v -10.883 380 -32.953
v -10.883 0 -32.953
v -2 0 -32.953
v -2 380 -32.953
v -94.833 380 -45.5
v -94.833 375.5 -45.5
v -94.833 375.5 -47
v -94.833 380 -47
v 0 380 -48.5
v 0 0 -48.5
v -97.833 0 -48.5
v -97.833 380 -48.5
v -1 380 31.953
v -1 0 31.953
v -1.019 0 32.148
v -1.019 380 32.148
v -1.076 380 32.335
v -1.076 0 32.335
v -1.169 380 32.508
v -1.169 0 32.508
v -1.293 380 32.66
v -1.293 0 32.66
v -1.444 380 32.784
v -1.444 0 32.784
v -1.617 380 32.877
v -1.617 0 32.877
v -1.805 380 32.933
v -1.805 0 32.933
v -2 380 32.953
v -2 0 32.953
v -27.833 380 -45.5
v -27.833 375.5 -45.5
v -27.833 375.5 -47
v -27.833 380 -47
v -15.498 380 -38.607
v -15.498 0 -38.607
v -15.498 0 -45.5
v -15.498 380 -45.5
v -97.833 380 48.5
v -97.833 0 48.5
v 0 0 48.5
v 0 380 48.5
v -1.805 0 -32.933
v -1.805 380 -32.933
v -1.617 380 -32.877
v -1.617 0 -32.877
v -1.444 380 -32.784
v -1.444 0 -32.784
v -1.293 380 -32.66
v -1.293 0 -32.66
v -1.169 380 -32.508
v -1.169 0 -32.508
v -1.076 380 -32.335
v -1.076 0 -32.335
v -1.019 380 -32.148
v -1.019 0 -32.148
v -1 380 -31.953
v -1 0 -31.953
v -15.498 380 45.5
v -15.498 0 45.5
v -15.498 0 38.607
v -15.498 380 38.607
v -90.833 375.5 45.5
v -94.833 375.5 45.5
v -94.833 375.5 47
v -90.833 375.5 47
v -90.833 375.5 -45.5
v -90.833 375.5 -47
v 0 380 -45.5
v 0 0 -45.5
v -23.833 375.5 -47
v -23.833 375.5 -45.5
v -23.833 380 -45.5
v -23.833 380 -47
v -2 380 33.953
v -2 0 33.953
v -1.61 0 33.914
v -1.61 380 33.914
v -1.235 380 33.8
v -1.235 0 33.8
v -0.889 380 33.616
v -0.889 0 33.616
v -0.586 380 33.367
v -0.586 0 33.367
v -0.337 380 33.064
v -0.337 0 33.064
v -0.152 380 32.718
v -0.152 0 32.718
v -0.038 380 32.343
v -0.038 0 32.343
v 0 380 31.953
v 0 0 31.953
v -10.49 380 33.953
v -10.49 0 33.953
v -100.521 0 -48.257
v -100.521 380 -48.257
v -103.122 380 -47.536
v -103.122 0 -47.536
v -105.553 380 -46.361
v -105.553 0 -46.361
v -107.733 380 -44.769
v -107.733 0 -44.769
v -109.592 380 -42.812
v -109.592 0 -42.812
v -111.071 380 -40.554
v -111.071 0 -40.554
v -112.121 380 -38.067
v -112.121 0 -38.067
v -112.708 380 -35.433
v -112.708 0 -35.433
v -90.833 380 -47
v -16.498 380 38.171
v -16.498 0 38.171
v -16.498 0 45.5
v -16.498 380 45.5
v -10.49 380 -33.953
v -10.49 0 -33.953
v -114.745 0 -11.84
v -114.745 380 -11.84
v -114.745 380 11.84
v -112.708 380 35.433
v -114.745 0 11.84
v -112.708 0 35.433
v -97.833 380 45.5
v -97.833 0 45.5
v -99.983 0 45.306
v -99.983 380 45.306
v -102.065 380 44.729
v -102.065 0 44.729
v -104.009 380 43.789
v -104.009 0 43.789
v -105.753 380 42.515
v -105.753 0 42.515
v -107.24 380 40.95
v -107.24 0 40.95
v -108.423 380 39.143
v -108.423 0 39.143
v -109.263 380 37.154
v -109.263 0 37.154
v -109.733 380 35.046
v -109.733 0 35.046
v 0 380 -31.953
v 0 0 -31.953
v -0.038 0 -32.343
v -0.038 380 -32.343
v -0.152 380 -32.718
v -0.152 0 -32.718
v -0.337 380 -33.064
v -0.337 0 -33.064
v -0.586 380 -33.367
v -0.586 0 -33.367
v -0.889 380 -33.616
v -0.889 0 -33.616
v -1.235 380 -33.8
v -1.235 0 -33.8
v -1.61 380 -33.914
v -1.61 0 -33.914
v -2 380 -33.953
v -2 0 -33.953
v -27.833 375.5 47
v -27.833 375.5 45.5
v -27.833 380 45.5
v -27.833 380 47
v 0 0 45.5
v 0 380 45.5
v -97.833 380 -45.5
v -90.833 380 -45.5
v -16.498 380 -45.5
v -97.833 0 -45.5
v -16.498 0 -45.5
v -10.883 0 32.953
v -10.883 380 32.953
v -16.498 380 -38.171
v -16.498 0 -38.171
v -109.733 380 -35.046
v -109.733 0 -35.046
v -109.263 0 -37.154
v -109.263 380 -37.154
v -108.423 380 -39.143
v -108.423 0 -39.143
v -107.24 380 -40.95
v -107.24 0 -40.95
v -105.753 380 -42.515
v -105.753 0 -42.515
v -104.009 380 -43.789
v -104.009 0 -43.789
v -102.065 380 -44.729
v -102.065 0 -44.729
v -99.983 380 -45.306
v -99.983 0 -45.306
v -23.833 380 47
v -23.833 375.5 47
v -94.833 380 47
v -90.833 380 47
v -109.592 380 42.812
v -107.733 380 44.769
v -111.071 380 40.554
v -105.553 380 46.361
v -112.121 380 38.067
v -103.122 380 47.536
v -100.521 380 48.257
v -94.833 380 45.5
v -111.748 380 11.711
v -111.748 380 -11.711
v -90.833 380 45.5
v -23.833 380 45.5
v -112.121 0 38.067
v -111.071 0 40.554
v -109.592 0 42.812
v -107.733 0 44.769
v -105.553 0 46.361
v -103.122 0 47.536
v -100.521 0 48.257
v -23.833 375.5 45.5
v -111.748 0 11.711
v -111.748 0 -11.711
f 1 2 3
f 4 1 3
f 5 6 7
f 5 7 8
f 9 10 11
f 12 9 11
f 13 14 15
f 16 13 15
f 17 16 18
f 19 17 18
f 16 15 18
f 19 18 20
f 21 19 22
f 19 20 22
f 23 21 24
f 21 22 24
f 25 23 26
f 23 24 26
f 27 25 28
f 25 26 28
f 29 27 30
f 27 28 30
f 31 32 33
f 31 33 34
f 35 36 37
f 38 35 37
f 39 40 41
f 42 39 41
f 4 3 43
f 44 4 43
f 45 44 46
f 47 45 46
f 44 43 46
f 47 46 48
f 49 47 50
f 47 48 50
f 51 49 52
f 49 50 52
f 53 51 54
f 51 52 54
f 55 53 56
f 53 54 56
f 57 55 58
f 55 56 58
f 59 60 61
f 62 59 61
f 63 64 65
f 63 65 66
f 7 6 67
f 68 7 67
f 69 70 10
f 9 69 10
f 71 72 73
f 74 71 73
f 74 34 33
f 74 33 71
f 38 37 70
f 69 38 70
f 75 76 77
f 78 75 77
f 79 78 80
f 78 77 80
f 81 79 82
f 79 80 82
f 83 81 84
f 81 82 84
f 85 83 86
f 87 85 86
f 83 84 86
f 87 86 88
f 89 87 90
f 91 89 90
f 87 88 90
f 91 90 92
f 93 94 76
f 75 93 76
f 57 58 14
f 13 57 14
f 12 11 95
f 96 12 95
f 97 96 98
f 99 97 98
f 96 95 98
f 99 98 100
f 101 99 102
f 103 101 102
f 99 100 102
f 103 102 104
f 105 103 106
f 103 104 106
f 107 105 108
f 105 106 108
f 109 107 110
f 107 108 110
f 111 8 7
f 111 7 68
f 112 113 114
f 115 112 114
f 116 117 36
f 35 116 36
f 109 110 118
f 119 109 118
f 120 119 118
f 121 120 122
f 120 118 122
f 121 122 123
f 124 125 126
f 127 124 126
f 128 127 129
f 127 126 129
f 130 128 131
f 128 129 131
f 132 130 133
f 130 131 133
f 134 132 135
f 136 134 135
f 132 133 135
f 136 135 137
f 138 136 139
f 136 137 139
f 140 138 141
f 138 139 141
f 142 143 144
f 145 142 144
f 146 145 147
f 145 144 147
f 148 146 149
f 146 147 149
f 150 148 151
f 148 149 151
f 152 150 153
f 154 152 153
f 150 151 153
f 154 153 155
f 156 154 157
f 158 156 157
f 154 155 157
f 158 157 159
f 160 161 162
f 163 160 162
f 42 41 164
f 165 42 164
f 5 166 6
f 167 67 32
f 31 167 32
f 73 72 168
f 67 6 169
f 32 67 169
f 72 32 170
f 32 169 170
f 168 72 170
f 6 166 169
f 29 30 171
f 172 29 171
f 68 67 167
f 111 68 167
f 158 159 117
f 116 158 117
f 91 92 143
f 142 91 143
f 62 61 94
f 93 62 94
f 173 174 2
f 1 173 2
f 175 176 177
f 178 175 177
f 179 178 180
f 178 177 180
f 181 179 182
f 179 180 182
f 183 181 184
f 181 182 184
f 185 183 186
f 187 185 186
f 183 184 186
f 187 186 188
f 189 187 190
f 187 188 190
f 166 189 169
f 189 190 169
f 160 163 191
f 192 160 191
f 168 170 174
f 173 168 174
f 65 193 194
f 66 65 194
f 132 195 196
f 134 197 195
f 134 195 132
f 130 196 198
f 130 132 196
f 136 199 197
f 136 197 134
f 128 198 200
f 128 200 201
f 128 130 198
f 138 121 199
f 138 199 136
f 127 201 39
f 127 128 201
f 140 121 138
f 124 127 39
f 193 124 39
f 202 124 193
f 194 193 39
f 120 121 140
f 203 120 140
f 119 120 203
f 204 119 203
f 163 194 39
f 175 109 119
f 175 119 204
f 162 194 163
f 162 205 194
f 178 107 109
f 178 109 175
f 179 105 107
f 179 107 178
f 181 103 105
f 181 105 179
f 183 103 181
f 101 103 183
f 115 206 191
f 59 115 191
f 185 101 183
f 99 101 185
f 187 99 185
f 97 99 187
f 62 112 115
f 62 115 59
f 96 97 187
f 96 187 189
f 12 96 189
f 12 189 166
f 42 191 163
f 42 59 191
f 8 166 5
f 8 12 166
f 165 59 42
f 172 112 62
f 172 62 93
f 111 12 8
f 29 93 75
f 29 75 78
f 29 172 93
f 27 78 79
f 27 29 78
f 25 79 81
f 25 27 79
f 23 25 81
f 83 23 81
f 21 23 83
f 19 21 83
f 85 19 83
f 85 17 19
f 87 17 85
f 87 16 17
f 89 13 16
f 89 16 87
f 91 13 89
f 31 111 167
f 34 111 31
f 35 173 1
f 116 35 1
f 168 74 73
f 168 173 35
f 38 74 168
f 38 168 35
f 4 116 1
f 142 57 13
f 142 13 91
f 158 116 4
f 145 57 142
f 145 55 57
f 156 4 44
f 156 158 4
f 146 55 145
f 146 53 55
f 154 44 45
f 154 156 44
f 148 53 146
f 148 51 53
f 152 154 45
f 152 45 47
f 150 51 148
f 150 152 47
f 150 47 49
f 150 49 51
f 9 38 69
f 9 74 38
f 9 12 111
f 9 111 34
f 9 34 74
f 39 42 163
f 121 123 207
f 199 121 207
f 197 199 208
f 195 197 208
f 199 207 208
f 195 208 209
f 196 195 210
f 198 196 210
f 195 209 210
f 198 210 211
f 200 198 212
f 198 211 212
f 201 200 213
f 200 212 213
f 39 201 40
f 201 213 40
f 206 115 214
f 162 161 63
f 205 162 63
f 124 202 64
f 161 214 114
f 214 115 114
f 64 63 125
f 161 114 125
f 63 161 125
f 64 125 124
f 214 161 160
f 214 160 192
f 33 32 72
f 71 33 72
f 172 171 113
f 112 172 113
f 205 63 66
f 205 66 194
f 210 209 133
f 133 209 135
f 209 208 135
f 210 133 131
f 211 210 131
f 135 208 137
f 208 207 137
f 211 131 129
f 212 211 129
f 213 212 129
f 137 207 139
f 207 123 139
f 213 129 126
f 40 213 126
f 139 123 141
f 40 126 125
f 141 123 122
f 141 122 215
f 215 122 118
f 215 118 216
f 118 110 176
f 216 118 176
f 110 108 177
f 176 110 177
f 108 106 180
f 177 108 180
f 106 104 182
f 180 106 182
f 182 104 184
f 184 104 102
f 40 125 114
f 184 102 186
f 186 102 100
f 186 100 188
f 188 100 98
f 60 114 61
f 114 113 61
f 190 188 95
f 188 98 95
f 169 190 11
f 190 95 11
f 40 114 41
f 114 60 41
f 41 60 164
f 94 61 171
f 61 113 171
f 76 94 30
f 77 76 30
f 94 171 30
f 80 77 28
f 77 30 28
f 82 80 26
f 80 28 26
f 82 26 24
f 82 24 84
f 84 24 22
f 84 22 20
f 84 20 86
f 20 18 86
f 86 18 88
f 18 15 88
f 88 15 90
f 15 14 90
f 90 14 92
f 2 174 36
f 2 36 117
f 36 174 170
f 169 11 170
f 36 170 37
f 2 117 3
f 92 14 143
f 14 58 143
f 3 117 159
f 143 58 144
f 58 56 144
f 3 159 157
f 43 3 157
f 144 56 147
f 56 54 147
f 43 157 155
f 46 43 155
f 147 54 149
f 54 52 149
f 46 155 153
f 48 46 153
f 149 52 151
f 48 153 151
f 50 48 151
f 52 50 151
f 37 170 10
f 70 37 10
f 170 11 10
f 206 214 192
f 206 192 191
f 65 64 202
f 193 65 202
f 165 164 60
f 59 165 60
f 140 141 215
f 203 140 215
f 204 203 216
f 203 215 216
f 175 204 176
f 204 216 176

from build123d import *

# Parameters (mm, degrees)
BOSS_EXTRUDE1_DEPTH = 380
SKETCH2_W           = 4
SKETCH2_H           = 9
CUT_EXTRUDE1_DEPTH  = 1.5
BOSS_EXTRUDE2_DEPTH = 380


with BuildPart() as part:
    # Sketch1 → Boss-Extrude1 (new body)
    with BuildSketch(Plane(origin=(0, 0, 0), x_dir=(1, 0, 0), z_dir=(0, 1, 0))):
        with BuildLine():
            Line((0, 48.5), (-97.832794656, 48.5))
            ThreePointArc((-97.832794656, 48.5), (-107.732532415, 44.769214361), (-112.707763578, 35.432692308))
            ThreePointArc((-112.707763578, 35.432692308), (-115, 0), (-112.707763578, -35.432692308))
            ThreePointArc((-112.707763578, -35.432692308), (-107.732532415, -44.769214361), (-97.832794656, -48.5))
            Line((-97.832794656, -48.5), (0, -48.5))
            Line((0, -48.5), (0, -45.5))
            Line((0, -45.5), (-97.832794656, -45.5))
            ThreePointArc((-97.832794656, -45.5), (-105.752584863, -42.515371489), (-109.732769794, -35.046153846))
            ThreePointArc((-109.732769794, -35.046153846), (-112, 0), (-109.732769794, 35.046153846))
            ThreePointArc((-109.732769794, 35.046153846), (-105.752584863, 42.515371489), (-97.832794656, 45.5))
            Line((-97.832794656, 45.5), (0, 45.5))
            Line((0, 45.5), (0, 48.5))
        make_face()
    extrude(amount=BOSS_EXTRUDE1_DEPTH)

    # Sketch2 → Cut-Extrude1 (cut)
    with BuildSketch(Plane.XY.offset(-45.5)):
        with Locations((-92.832794656, 380)):
            Rectangle(SKETCH2_W, SKETCH2_H)
        with Locations((-25.832794656, 380)):
            Rectangle(SKETCH2_W, SKETCH2_H)
    cut_extrude1 = extrude(amount=-CUT_EXTRUDE1_DEPTH, mode=Mode.SUBTRACT)

    # Mirror1: Cut-Extrude1 across plane
    add(cut_extrude1.mirror(Plane.XY), mode=Mode.SUBTRACT)

    # Sketch3 → Boss-Extrude2 (add)
    with BuildSketch(Plane(origin=(0, 0, 0), x_dir=(1, 0, 0), z_dir=(0, 1, 0))):
        with BuildLine():
            Line((0, 0), (0, 31.952645856))
            ThreePointArc((0, 31.952645856), (-0.585786438, 33.366859418), (-2, 33.952645856))
            Line((-2, 33.952645856), (-10.490338609, 33.952645856))
            Line((-10.490338609, 33.952645856), (-15.497576902, 38.606995774))
            Line((-15.497576902, 38.606995774), (-15.497576902, 45.5))
            Line((-15.497576902, 45.5), (-16.497576902, 45.5))
            Line((-16.497576902, 45.5), (-16.497576902, 38.171230588))
            Line((-16.497576902, 38.171230588), (-10.88332405, 32.952645856))
            Line((-10.88332405, 32.952645856), (-2, 32.952645856))
            ThreePointArc((-2, 32.952645856), (-1.292893219, 32.659752637), (-1, 31.952645856))
            Line((-1, 31.952645856), (-1, 0))
            Line((-1, 0), (-1, -31.952645856))
            ThreePointArc((-1, -31.952645856), (-1.292893219, -32.659752637), (-2, -32.952645856))
            Line((-2, -32.952645856), (-10.88332405, -32.952645856))
            Line((-10.88332405, -32.952645856), (-16.497576902, -38.171230588))
            Line((-16.497576902, -38.171230588), (-16.497576902, -45.5))
            Line((-16.497576902, -45.5), (-15.497576902, -45.5))
            Line((-15.497576902, -45.5), (-15.497576902, -38.606995774))
            Line((-15.497576902, -38.606995774), (-10.490338609, -33.952645856))
            Line((-10.490338609, -33.952645856), (-2, -33.952645856))
            ThreePointArc((-2, -33.952645856), (-0.585786438, -33.366859418), (0, -31.952645856))
            Line((0, -31.952645856), (0, 0))
        make_face()
    extrude(amount=BOSS_EXTRUDE2_DEPTH)


solid = part.part
